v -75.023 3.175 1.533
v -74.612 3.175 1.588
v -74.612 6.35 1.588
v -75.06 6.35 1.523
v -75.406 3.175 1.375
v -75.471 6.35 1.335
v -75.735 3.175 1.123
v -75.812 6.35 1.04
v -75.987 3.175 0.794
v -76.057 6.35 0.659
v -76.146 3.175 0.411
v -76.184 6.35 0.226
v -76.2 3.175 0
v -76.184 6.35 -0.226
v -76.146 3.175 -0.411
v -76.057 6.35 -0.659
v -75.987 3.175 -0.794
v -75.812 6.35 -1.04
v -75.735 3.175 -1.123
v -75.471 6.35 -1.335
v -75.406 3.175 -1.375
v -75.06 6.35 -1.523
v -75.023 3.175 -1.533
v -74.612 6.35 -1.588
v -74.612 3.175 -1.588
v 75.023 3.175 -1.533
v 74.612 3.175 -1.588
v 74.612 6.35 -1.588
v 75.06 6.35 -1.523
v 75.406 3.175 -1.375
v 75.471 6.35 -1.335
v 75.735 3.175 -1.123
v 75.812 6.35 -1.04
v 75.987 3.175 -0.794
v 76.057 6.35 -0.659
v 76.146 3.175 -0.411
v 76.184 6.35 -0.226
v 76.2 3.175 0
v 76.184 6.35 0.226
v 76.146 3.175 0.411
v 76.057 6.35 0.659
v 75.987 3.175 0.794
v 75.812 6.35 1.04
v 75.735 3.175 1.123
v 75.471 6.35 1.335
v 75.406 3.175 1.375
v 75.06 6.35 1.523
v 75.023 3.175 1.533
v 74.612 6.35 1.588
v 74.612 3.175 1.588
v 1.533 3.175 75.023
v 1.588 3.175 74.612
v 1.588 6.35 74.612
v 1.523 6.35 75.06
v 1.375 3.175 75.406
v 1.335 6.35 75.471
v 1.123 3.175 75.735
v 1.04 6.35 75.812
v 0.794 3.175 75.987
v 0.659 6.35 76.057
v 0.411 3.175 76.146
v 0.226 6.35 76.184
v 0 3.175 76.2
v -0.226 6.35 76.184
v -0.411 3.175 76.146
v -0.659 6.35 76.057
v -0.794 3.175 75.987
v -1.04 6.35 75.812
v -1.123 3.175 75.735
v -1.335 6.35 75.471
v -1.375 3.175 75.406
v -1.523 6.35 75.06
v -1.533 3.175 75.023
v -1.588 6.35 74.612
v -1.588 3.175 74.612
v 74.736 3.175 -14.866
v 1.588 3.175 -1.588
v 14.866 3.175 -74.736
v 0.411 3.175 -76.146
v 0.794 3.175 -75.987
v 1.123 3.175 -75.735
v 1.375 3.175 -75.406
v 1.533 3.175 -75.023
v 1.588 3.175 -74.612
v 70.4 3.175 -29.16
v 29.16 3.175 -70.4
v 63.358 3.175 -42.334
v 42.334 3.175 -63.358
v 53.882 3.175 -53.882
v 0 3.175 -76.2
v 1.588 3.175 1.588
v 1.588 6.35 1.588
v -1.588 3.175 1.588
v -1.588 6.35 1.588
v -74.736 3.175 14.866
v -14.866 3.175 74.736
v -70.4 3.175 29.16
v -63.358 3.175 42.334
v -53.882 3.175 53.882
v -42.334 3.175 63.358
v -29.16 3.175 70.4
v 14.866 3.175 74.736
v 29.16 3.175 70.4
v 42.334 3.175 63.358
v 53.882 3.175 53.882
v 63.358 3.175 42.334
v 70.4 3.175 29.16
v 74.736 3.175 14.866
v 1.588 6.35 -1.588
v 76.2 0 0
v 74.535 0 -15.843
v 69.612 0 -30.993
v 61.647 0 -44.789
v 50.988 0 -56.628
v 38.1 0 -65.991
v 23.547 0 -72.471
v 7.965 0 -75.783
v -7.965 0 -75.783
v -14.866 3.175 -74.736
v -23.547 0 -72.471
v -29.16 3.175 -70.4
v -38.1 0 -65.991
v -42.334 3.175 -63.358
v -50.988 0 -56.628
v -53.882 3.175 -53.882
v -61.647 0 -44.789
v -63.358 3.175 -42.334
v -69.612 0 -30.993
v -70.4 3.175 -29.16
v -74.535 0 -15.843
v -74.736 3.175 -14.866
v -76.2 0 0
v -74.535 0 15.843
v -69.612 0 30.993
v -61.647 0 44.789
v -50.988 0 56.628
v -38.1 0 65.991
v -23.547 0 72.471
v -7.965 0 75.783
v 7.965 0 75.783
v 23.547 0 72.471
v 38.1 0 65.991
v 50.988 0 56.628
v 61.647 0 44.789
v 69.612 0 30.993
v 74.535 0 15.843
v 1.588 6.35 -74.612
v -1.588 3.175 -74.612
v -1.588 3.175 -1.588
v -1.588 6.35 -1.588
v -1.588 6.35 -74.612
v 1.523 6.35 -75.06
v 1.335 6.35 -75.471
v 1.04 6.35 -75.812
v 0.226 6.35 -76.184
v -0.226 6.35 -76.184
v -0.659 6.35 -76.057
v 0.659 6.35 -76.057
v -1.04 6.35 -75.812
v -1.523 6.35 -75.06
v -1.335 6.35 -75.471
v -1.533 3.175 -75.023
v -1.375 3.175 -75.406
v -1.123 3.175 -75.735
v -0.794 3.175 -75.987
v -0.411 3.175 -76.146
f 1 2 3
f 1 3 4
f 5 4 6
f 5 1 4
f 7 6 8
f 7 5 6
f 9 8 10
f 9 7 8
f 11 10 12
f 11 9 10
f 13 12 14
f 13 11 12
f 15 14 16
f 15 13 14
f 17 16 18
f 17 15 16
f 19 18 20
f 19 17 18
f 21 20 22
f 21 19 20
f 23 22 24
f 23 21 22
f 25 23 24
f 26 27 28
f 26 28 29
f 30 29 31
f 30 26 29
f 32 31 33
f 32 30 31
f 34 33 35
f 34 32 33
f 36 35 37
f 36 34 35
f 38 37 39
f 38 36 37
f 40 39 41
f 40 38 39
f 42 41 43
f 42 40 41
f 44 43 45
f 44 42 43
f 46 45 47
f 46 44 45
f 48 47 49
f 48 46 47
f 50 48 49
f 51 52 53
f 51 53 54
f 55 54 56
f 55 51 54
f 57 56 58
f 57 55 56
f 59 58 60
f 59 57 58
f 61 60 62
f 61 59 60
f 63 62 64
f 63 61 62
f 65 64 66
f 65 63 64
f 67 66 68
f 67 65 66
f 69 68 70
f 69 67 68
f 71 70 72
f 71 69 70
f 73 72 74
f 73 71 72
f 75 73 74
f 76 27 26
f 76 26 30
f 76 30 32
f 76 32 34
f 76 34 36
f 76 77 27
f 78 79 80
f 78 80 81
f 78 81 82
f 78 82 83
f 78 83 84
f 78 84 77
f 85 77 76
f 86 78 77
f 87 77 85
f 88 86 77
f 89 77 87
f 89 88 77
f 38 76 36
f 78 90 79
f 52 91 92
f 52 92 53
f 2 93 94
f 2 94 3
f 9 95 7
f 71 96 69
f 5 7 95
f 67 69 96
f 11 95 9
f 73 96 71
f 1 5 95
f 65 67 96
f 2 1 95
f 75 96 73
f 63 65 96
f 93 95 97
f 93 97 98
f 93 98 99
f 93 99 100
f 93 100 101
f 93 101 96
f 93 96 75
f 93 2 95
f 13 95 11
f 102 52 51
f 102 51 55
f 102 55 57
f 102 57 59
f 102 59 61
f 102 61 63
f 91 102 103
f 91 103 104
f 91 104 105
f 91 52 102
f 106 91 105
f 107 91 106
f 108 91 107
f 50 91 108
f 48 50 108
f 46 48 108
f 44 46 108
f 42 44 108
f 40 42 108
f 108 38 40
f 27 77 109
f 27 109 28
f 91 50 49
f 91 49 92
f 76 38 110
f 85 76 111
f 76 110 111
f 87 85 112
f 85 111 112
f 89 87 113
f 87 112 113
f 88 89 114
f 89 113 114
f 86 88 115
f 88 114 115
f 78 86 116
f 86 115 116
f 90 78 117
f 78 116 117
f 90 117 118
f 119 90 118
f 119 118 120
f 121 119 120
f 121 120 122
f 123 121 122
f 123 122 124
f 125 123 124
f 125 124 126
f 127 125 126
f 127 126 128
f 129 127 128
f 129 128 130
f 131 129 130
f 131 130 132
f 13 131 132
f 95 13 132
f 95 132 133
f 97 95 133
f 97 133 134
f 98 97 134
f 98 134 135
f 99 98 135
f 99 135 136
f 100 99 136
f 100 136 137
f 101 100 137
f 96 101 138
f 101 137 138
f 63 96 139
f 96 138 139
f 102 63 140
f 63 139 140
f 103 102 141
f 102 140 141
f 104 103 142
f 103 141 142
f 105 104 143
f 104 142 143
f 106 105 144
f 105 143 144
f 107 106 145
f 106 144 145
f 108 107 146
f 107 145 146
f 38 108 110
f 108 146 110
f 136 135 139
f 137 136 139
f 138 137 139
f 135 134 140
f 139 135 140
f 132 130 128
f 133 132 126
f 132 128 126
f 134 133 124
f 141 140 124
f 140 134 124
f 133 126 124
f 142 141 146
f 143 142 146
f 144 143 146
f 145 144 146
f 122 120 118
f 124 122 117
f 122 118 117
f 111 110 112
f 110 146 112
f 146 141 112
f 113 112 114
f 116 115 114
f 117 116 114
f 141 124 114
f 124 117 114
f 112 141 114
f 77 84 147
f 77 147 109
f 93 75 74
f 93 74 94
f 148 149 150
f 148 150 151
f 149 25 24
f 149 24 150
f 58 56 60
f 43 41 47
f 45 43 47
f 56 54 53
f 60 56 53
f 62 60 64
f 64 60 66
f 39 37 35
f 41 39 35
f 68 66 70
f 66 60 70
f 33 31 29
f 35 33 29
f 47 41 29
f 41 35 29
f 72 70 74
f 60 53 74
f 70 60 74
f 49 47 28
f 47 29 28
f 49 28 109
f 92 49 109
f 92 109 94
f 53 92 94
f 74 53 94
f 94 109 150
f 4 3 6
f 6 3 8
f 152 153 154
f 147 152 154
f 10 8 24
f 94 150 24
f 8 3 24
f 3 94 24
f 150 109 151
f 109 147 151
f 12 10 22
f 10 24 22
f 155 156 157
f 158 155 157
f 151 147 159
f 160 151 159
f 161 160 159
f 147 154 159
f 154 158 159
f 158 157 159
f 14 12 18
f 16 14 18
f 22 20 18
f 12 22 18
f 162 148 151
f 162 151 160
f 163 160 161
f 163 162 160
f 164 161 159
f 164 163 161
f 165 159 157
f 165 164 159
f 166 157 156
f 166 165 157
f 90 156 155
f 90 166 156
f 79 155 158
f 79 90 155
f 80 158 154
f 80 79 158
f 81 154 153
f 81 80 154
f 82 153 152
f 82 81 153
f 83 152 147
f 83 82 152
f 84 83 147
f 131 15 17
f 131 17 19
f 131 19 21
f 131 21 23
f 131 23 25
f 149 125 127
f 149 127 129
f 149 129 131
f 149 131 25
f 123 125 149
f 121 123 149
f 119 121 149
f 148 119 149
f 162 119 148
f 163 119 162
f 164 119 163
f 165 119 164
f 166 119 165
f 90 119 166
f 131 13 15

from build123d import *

# Parameters (mm, degrees)
SKETCH1_R           = 76.2
BOSS_EXTRUDE1_DEPTH = 3.175
BOSS_EXTRUDE2_DEPTH = 3.175


with BuildPart() as part:
    # Sketch1 → Boss-Extrude1 (new body)
    with BuildSketch(Plane(origin=(0, 0, 0), x_dir=(1, 0, 0), z_dir=(0, 1, 0))):
        Circle(SKETCH1_R)
    extrude(amount=BOSS_EXTRUDE1_DEPTH)

    # Sketch2 → Boss-Extrude2 (add)
    with BuildSketch(Plane(origin=(0, 3.175, 0), x_dir=(1, 0, 0), z_dir=(0, 1, 0))):
        with BuildLine():
            Line((-74.6125, 1.5875), (74.6125, 1.5875))
            ThreePointArc((74.6125, 1.5875), (76.2, 0), (74.6125, -1.5875))
            Line((74.6125, -1.5875), (-74.6125, -1.5875))
            ThreePointArc((-74.6125, -1.5875), (-76.2, 0), (-74.6125, 1.5875))
        make_face()
        with BuildLine():
            Line((1.5875, 74.6125), (1.5875, -74.6125))
            ThreePointArc((1.5875, -74.6125), (0, -76.2), (-1.5875, -74.6125))
            Line((-1.5875, -74.6125), (-1.5875, 74.6125))
            ThreePointArc((-1.5875, 74.6125), (0, 76.2), (1.5875, 74.6125))
        make_face()
    extrude(amount=BOSS_EXTRUDE2_DEPTH)


solid = part.part
